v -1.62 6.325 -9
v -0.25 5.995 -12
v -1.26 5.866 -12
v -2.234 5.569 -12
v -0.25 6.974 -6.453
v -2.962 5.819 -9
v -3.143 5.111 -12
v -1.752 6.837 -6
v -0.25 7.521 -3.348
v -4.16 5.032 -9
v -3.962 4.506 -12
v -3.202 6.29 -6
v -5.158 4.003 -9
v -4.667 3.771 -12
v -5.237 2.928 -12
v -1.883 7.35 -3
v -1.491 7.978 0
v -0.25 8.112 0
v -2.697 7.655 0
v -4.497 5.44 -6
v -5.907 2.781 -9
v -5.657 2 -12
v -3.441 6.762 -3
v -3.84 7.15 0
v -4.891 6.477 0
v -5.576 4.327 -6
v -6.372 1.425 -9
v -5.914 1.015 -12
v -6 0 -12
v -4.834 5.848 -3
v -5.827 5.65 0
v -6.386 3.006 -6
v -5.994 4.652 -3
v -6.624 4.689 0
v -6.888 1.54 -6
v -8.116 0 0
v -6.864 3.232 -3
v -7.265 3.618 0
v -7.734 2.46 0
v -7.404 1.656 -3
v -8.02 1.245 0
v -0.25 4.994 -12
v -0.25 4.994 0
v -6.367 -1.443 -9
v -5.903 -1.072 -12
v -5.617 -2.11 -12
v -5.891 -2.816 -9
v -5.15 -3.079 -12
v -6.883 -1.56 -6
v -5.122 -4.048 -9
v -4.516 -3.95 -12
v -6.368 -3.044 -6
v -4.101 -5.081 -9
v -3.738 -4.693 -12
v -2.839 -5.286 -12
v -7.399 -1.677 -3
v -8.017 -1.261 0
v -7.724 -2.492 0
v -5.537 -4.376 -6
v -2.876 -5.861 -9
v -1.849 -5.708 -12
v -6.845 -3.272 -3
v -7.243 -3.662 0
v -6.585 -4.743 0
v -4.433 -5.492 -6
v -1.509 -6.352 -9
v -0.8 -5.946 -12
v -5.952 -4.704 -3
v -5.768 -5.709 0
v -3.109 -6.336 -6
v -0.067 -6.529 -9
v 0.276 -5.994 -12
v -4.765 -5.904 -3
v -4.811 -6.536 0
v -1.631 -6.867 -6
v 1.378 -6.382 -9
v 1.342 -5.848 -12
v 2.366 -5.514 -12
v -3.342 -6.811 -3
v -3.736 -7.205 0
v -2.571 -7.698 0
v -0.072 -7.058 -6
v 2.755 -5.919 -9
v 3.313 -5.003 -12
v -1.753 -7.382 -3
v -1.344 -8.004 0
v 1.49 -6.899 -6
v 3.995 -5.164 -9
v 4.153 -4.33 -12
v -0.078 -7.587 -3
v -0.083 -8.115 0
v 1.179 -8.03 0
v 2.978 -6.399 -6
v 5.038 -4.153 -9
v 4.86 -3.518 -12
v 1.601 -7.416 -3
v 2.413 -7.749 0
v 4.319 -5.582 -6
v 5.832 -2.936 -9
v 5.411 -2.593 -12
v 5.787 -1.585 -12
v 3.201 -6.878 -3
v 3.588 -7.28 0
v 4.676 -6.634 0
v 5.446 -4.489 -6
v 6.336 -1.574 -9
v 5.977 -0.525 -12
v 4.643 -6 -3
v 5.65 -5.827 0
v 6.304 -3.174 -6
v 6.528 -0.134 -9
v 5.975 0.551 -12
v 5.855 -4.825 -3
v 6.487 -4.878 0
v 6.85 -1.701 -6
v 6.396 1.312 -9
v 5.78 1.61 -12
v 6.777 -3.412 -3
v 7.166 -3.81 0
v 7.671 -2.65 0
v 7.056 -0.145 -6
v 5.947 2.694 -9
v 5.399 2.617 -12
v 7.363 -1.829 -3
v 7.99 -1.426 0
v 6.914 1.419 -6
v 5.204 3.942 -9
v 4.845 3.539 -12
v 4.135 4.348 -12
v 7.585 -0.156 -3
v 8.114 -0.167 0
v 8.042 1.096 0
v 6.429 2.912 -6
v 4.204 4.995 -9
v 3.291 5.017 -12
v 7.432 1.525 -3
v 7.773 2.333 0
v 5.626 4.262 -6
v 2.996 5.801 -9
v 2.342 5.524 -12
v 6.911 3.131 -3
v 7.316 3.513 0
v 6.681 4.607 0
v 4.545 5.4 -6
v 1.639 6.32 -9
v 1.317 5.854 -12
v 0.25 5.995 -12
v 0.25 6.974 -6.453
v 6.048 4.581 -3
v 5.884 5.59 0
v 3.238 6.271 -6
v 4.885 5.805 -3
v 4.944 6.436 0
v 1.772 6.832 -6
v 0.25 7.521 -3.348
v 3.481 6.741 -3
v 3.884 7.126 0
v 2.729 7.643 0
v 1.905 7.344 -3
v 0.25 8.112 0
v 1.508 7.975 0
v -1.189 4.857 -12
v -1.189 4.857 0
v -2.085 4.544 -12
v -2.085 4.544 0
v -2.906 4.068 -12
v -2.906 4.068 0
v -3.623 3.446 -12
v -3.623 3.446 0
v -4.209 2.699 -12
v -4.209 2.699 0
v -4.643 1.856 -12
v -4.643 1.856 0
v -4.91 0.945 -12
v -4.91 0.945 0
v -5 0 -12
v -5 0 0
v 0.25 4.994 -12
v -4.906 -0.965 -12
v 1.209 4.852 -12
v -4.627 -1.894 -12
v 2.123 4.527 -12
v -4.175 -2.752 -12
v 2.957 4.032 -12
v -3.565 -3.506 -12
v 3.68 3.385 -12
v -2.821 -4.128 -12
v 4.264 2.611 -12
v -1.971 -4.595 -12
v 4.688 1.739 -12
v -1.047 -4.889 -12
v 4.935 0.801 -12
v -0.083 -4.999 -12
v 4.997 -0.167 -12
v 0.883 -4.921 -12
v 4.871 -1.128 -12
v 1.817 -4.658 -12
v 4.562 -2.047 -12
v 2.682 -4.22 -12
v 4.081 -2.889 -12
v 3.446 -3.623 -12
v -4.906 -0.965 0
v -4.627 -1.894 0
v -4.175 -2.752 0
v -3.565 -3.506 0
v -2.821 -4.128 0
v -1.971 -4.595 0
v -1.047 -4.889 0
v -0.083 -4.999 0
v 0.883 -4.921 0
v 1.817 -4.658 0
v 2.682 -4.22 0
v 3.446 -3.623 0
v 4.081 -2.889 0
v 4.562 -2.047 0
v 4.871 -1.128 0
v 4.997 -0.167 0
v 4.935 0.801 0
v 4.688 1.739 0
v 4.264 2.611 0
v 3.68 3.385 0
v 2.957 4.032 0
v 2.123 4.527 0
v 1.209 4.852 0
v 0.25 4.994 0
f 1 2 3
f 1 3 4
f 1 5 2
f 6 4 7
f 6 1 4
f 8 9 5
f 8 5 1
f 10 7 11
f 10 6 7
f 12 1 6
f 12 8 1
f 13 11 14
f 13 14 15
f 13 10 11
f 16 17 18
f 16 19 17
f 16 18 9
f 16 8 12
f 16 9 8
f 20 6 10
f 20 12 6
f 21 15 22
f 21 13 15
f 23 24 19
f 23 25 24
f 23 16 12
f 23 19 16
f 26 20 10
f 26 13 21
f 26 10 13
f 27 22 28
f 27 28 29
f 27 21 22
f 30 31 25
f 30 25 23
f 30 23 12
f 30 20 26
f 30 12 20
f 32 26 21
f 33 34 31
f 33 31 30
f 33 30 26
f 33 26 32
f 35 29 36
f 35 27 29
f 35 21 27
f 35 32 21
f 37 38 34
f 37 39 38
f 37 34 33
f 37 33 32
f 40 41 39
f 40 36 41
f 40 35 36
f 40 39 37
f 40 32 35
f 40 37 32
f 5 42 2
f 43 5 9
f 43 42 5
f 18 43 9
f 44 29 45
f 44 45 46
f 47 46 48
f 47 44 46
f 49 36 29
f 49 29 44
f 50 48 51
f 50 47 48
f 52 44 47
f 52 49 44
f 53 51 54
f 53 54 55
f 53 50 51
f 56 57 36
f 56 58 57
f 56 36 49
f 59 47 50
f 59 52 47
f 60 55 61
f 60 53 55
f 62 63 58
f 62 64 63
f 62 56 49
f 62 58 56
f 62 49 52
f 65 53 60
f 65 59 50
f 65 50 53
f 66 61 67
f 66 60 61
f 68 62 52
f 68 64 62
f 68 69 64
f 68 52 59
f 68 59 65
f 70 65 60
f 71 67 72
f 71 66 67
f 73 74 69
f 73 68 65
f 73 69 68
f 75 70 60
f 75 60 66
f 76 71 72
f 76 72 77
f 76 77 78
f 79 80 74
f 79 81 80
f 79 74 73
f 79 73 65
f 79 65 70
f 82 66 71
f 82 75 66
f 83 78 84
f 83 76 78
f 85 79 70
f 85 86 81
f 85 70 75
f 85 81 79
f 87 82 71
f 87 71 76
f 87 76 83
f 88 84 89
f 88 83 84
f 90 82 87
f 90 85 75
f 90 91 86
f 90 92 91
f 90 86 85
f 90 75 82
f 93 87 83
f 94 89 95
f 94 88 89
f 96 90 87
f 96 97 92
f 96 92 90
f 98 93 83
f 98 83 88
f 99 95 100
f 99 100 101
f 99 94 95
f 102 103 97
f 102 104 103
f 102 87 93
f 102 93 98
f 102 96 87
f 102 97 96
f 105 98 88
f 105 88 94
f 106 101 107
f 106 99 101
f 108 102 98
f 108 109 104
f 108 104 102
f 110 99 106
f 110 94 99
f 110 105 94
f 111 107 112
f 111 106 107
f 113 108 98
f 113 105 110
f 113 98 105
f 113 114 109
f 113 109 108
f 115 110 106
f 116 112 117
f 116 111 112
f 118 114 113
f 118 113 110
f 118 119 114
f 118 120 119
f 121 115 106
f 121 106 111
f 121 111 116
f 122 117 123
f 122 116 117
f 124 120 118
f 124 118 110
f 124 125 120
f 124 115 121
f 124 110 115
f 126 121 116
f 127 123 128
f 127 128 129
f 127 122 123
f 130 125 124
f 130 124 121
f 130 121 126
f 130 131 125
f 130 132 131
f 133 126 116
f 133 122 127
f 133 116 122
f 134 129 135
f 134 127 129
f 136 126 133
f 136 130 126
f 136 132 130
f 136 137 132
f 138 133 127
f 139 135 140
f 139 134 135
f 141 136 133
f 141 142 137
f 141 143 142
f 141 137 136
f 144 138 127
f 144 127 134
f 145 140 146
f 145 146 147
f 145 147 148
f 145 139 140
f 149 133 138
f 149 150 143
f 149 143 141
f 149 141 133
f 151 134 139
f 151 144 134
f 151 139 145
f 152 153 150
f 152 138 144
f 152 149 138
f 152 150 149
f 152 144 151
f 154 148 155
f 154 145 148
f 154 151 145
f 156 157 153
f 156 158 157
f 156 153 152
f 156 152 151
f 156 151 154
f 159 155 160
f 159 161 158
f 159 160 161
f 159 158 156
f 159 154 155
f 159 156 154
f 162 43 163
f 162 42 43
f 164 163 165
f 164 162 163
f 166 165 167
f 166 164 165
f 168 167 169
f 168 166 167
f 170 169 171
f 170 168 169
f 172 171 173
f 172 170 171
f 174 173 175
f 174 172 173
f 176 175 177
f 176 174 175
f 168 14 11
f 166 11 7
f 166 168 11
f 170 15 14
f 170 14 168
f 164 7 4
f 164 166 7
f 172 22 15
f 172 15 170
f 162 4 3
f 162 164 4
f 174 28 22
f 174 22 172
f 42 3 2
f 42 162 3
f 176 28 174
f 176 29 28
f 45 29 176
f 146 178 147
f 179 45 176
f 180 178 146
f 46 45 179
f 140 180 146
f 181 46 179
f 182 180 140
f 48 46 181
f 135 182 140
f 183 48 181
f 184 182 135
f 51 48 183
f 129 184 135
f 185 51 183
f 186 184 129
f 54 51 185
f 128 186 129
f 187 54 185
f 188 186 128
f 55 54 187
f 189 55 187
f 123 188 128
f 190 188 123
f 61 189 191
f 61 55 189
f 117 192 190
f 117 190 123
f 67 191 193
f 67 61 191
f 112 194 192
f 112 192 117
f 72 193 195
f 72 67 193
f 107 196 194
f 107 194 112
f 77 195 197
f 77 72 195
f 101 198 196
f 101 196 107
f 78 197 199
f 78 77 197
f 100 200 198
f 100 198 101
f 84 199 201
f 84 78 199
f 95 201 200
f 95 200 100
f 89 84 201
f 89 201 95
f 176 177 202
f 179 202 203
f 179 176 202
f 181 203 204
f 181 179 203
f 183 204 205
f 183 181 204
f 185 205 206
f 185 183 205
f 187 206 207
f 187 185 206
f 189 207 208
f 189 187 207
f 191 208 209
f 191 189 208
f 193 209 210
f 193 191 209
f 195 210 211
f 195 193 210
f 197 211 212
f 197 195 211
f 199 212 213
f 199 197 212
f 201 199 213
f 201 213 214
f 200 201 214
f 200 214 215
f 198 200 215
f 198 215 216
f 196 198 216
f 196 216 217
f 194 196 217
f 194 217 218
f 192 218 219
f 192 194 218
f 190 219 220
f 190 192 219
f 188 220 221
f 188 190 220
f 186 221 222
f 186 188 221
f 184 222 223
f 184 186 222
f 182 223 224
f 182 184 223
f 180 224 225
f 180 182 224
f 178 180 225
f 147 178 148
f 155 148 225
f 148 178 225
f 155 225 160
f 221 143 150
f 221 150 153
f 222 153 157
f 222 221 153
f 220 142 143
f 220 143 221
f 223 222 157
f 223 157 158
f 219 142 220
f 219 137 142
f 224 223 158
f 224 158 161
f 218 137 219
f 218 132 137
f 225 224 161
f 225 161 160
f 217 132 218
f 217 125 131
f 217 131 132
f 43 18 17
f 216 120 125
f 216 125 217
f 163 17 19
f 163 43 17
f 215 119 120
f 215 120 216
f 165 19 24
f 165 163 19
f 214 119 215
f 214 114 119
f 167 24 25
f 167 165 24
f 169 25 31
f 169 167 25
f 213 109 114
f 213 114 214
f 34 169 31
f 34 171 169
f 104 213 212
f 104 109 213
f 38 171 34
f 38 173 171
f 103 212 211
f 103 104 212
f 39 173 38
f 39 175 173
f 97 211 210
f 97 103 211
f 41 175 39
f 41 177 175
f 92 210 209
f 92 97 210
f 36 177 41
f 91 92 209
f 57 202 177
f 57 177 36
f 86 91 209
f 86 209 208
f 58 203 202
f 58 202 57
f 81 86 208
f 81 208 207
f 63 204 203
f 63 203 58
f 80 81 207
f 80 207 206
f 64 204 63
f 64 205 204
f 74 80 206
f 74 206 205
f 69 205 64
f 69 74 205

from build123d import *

# Parameters (mm, degrees)
CUT_EXTRUDE1_REACH = 18.605
SKETCH2_W          = 0.5
SKETCH2_H          = 8.115923769


with BuildPart() as part:
    # Sketch1 → Revolve1 (revolve)
    with BuildSketch(Plane(origin=(0, 0, 0), x_dir=(0, 0, -1), z_dir=(1, 0, 0)), mode=Mode.PRIVATE) as revolve1_sk:
        Polygon((0, 8.115923769), (0, 5), (12, 5), (12, 6), align=None)
    revolve(revolve1_sk.sketch.rotate(Axis((0, 0, -14.189132044), (0, 0, 1)), 90), axis=Axis((0, 0, -14.189132044), (0, 0, 1)))

    # Sketch2 → Cut-Extrude1 (cut, up to next)
    with BuildSketch(Plane.XY, mode=Mode.PRIVATE) as cut_extrude1_sk1:
        with Locations((0, 4.057961885)):
            Rectangle(SKETCH2_W, SKETCH2_H)
    cut_extrude1_tool1 = extrude(cut_extrude1_sk1.sketch, amount=-CUT_EXTRUDE1_REACH, mode=Mode.PRIVATE) & part.part
    add(cut_extrude1_tool1.solids().sort_by_distance((0, 4.057962, 0))[0], mode=Mode.SUBTRACT)


solid = part.part
